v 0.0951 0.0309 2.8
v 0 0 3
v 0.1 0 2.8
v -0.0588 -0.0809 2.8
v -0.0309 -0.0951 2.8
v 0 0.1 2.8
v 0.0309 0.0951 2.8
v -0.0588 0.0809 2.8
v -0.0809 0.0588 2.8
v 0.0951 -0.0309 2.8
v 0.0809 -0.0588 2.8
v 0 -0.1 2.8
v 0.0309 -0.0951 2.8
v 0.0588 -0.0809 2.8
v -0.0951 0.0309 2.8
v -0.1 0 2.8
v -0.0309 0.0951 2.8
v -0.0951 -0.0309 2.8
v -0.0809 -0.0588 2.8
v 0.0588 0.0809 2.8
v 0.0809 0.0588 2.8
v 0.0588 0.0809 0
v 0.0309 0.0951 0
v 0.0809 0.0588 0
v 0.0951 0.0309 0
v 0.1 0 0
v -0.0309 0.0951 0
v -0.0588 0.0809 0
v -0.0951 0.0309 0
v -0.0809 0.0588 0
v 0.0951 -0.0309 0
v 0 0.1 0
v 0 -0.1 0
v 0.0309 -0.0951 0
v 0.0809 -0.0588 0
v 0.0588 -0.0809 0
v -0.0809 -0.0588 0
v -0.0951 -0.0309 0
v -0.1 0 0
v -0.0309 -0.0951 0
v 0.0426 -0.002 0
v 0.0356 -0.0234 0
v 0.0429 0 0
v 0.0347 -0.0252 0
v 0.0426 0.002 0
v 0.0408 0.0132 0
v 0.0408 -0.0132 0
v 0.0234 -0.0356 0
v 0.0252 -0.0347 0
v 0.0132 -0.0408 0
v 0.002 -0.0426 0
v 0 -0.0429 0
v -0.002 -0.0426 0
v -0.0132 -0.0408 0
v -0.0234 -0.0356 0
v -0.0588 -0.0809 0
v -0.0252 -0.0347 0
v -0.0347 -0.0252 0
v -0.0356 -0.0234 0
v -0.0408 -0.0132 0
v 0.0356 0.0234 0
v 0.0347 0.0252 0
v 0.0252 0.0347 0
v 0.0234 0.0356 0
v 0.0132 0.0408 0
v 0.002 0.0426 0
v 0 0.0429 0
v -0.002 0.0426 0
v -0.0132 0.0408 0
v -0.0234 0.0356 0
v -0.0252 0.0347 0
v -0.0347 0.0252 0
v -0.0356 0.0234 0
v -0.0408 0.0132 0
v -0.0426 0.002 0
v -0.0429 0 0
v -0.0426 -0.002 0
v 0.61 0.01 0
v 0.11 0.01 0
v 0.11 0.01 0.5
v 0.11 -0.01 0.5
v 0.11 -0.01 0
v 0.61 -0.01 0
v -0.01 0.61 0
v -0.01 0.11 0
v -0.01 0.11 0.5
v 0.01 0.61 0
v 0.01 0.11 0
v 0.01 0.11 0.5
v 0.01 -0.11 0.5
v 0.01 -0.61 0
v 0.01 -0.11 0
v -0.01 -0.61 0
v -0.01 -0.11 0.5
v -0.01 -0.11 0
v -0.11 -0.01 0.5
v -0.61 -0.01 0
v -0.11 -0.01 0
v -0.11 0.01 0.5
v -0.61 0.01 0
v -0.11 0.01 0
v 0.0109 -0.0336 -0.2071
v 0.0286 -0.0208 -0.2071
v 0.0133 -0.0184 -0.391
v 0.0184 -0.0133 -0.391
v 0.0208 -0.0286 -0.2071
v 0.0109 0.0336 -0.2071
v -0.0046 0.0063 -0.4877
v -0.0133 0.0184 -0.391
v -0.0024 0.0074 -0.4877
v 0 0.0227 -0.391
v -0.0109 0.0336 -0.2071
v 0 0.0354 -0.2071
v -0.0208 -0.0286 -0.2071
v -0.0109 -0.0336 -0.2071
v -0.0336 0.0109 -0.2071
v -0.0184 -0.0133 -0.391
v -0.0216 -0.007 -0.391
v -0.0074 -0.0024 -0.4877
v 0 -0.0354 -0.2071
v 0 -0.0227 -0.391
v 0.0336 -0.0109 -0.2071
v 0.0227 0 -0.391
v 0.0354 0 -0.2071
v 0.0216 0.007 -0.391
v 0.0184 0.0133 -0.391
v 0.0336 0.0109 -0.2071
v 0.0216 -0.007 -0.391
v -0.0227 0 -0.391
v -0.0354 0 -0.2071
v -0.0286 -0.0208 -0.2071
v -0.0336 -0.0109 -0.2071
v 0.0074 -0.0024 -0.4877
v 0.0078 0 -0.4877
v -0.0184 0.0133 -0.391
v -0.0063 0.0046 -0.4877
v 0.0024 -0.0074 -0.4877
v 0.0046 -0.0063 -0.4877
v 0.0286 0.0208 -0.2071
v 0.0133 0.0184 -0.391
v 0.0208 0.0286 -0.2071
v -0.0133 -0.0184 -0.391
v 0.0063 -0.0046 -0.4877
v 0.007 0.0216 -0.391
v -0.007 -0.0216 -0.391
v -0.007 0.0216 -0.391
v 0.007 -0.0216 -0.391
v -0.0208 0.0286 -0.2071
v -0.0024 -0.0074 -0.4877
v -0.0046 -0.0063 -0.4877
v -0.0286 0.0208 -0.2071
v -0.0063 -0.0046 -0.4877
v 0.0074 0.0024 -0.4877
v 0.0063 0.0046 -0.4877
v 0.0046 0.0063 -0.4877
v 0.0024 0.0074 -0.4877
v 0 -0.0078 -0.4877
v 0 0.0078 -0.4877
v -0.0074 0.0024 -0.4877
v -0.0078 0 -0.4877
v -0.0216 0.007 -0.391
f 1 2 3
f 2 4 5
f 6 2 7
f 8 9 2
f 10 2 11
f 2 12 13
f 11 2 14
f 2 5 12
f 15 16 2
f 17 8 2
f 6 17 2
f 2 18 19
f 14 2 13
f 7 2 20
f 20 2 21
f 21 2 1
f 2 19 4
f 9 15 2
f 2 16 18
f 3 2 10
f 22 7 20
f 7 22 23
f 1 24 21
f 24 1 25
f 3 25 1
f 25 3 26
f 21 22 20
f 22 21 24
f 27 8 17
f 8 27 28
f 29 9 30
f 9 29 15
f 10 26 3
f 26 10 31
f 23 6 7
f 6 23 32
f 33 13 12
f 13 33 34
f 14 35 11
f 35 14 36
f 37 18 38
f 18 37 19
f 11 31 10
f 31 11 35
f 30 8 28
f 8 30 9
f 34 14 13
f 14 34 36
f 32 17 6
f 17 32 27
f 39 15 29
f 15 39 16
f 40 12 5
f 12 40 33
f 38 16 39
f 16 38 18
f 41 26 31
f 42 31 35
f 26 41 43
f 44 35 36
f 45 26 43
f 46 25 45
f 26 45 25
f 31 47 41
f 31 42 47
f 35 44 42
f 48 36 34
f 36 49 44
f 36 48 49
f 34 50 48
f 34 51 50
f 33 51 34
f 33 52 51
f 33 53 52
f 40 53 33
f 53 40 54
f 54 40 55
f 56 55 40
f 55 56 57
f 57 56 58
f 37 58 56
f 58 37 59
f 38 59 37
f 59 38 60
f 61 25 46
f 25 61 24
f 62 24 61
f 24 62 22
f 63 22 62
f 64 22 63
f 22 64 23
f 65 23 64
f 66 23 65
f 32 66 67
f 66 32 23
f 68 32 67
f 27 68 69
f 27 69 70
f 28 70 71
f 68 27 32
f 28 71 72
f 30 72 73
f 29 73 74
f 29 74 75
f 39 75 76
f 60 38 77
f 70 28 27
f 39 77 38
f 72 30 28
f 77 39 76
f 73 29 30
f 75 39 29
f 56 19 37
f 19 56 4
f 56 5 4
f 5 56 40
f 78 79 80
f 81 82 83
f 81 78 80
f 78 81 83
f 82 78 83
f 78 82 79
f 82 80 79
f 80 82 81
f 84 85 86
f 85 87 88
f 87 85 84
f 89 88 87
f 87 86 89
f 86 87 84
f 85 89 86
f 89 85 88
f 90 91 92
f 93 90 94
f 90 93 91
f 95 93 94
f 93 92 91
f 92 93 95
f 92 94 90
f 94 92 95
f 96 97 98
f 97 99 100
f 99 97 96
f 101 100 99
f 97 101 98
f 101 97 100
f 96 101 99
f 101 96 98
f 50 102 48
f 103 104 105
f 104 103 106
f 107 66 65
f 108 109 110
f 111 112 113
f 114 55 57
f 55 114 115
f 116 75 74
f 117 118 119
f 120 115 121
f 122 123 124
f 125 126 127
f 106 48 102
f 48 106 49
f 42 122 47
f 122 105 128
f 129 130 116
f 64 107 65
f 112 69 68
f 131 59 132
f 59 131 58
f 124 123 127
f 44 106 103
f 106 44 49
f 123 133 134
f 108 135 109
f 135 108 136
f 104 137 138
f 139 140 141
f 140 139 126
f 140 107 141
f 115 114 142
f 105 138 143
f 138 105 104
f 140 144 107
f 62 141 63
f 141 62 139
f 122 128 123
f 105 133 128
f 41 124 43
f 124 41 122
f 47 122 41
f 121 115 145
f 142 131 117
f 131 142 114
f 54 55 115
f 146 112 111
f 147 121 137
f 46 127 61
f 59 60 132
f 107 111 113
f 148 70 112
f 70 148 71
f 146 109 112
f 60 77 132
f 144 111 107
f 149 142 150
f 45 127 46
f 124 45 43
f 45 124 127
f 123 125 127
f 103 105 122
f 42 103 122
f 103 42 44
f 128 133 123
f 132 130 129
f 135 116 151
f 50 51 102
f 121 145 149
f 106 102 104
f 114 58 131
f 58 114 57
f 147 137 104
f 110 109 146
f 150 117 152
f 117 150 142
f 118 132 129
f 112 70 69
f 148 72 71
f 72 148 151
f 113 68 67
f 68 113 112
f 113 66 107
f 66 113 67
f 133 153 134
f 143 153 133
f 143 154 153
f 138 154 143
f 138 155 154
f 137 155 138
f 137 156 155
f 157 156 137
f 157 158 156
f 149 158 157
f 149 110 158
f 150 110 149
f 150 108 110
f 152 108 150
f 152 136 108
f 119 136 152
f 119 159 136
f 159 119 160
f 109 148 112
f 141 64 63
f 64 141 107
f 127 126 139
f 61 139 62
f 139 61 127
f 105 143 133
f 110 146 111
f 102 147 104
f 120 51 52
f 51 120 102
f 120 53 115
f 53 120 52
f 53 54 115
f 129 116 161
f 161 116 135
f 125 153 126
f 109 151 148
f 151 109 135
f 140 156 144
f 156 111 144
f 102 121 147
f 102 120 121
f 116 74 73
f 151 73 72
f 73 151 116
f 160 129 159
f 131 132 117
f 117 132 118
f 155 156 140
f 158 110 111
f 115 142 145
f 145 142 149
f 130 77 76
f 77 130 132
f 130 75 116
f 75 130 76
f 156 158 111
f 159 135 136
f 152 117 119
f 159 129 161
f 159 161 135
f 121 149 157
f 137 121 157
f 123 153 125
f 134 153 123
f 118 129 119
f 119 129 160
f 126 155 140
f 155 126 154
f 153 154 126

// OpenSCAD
$fn = 20; // use 20 sides for circle
l = 3; // length, m
r = 0.1; // radius, m
n = 0.2; // nose length
fh = 0.02; // fin thickness
fl = 0.5; // fin length

module nose_cone() {
    color([0.3, 0.3, 0.3]) translate([0, 0, l-n]) cylinder(h=n, r1=r, r2=0);
}

module body() {
    color([0.7, 0.7, 0.7]) cylinder(h=l-n, r=r);
}

module fin() {
    color([0.3, 0.3, 0.3]) rotate([90, 0, 0]) linear_extrude(fh, center=true) polygon([
    [r+0.01, fl],
    [r+0.01 + fl, 0],
    [r+0.01, 0]
    ]);
}

module plume() {
    color([1, 1, 0, 0.5]) scale([r*0.5, r*0.5, 1]) 
    translate([0, 0, 0.5]) sphere(r=1);
}

part="assembly";

if (part == "assembly") {
    nose_cone();
    body();
    fin();
    rotate([0, 0, 90]) fin();
    rotate([0, 0, -90]) fin();
    rotate([0, 0, 180]) fin();
    plume();
} else if (part == "nose_cone") {
    nose_cone();
} else if (part == "body") {
    body();
} else if (part == "fin") {
    fin();
} else if (part =="plume") {
    plume();
}
